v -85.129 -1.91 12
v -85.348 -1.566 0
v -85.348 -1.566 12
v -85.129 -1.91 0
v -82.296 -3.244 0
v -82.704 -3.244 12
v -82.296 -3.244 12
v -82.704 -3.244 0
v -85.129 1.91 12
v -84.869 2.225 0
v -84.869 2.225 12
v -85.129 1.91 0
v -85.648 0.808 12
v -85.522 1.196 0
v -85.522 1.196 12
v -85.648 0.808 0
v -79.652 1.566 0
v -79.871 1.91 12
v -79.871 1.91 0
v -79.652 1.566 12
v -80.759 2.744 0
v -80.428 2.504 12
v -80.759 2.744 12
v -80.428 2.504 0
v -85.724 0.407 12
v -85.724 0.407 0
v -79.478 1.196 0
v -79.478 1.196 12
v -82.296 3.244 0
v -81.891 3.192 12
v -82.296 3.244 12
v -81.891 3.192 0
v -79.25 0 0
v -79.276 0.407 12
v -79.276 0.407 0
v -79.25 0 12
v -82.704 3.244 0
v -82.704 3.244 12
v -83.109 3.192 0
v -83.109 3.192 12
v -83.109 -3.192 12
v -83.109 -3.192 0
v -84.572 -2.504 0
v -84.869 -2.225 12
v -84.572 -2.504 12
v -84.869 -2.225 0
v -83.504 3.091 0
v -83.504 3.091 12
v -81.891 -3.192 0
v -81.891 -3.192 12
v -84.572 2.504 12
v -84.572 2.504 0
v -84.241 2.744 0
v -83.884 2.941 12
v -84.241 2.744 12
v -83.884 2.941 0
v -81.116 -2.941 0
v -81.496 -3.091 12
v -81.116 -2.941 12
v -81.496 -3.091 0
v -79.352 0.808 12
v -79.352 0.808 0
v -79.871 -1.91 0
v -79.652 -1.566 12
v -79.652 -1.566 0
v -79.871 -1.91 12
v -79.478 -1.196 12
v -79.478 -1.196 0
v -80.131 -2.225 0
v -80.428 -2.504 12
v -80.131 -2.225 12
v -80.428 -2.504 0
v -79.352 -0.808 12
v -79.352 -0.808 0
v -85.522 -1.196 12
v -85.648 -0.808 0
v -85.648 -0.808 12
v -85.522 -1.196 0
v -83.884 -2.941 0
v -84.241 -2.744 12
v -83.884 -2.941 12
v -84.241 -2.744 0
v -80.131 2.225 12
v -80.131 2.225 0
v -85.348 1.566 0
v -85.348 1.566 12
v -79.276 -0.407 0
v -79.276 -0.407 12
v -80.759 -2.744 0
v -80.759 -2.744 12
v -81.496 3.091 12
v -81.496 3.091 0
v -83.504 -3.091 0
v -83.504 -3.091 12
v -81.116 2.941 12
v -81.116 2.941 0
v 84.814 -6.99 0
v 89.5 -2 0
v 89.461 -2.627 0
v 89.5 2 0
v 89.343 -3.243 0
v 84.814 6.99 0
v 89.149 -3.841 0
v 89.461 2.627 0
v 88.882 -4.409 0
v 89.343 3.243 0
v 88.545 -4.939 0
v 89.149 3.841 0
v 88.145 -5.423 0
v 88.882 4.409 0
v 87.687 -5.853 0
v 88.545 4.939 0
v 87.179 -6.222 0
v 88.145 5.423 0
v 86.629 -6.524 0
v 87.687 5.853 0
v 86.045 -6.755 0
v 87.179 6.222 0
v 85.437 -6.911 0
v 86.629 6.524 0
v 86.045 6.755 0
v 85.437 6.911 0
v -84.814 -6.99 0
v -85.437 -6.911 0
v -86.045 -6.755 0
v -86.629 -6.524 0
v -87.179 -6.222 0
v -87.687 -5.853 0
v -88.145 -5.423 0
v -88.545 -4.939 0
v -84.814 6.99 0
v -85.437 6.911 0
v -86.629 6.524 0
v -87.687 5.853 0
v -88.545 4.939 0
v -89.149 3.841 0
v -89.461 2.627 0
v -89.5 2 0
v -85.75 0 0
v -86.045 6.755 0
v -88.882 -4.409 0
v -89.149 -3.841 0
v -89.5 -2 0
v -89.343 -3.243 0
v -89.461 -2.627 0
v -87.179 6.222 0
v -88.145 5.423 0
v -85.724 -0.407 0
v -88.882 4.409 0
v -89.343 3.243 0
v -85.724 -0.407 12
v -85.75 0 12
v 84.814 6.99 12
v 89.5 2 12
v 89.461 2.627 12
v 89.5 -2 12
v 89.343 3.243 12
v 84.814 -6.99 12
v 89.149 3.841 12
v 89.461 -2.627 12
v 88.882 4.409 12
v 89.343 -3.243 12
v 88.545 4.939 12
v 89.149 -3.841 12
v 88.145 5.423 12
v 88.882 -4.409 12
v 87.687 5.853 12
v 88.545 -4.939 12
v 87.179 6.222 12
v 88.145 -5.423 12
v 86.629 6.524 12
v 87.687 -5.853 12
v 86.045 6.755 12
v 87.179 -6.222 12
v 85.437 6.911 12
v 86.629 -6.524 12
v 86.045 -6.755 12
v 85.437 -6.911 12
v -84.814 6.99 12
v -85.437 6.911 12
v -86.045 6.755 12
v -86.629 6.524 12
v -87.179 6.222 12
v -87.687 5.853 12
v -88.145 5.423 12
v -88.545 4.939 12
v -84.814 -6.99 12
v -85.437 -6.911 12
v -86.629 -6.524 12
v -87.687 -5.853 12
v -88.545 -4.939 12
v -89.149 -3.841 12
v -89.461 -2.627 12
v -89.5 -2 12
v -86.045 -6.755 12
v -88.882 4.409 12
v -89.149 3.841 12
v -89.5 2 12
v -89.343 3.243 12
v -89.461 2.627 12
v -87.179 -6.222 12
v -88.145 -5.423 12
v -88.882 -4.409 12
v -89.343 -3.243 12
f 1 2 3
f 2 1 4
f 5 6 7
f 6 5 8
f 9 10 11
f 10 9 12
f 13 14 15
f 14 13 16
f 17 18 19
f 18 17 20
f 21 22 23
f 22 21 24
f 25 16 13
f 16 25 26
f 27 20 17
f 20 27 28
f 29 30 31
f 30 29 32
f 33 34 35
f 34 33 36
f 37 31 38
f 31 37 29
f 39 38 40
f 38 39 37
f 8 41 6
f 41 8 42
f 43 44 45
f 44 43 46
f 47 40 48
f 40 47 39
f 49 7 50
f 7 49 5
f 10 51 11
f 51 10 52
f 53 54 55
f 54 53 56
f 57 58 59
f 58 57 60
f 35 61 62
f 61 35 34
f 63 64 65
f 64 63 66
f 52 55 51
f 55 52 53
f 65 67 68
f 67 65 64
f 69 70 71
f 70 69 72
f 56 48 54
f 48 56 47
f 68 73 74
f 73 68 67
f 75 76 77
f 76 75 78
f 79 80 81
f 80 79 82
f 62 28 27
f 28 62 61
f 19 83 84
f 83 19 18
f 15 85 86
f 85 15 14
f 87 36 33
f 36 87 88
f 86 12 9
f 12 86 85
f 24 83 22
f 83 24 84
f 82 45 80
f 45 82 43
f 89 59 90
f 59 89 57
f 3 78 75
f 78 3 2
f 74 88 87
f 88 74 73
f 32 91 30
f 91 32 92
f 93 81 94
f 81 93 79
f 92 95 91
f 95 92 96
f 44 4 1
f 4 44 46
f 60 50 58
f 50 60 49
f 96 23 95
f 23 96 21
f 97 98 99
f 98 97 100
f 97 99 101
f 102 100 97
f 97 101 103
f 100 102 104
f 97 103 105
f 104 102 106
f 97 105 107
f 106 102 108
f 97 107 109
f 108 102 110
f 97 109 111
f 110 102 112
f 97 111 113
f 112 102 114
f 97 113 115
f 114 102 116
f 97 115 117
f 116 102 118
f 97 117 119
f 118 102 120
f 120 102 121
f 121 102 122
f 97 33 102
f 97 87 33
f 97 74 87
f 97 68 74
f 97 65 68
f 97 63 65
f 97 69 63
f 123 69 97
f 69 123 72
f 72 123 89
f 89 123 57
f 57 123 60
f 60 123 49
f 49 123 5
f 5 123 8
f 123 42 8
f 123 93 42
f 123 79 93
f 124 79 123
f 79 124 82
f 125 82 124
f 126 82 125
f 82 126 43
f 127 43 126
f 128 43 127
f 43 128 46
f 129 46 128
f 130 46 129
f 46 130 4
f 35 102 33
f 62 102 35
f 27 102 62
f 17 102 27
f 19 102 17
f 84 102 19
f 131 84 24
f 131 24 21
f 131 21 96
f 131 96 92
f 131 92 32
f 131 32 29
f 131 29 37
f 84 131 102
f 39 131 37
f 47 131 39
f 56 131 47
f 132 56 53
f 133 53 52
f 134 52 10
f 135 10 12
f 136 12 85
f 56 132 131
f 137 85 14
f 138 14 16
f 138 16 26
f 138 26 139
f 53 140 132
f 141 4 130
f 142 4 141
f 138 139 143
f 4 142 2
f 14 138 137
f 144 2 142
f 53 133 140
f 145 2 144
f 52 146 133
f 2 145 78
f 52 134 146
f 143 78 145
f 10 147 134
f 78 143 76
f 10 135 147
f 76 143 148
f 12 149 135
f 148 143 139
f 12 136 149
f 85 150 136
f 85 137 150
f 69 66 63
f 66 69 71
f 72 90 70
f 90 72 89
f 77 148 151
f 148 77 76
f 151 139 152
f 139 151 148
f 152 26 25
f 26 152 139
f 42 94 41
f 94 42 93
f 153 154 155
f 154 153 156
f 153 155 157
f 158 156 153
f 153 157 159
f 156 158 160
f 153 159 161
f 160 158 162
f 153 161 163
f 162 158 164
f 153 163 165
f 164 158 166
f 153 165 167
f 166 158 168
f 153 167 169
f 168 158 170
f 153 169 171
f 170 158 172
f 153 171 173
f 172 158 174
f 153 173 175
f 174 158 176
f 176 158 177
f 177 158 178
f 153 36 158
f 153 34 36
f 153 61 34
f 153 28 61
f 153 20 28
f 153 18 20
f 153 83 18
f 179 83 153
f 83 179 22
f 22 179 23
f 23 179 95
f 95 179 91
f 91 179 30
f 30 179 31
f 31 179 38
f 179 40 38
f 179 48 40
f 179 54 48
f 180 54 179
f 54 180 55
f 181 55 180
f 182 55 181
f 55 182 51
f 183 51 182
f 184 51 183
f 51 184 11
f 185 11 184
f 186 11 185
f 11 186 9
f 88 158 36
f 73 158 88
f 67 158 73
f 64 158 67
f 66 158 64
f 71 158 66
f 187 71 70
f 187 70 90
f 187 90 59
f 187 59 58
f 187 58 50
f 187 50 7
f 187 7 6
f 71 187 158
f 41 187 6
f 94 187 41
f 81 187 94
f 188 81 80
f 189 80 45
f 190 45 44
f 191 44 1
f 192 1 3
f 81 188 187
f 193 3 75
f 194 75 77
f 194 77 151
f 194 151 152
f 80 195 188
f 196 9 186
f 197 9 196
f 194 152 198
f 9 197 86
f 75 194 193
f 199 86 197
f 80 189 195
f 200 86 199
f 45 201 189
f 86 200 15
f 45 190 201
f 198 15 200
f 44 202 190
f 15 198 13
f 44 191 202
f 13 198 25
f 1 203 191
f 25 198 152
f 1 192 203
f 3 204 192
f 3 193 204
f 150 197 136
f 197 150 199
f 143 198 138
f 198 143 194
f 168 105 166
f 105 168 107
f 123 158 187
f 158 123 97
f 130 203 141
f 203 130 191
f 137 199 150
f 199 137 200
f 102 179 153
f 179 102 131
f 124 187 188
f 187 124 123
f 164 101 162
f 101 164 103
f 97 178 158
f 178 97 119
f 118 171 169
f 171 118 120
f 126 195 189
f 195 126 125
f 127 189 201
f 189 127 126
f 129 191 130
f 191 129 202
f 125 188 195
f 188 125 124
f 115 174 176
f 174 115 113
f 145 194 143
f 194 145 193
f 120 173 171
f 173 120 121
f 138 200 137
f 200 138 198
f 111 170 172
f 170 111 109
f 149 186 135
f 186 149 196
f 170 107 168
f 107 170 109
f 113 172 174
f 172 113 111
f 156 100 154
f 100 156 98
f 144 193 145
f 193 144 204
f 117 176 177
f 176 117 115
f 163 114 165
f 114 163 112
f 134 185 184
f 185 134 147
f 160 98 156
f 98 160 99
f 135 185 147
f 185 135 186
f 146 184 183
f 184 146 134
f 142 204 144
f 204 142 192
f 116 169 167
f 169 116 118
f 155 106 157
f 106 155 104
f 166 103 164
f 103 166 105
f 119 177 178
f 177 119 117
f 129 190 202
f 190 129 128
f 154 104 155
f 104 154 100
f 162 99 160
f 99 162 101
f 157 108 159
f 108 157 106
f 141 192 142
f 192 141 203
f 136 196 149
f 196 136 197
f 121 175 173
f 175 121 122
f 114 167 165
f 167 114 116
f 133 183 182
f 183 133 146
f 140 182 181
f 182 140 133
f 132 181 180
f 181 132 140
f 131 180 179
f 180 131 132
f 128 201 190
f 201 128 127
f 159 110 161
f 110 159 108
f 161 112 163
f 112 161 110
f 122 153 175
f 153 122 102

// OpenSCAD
$fn = 50;


difference() {
	union() {
		hull() {
			translate(v = [-84.5000000000, 2.0000000000, 0]) {
				cylinder(h = 12, r = 5);
			}
			translate(v = [84.5000000000, 2.0000000000, 0]) {
				cylinder(h = 12, r = 5);
			}
			translate(v = [-84.5000000000, -2.0000000000, 0]) {
				cylinder(h = 12, r = 5);
			}
			translate(v = [84.5000000000, -2.0000000000, 0]) {
				cylinder(h = 12, r = 5);
			}
		}
	}
	union() {
		translate(v = [-82.5000000000, 0.0000000000, 0]) {
			cylinder(h = 12, r = 3.2500000000);
		}
		translate(v = [-82.5000000000, 0.0000000000, 0]) {
			cylinder(h = 12, r = 1.8000000000);
		}
		translate(v = [-82.5000000000, 0.0000000000, 0]) {
			cylinder(h = 12, r = 1.8000000000);
		}
		translate(v = [-82.5000000000, 0.0000000000, 0]) {
			cylinder(h = 12, r = 1.8000000000);
		}
	}
}
